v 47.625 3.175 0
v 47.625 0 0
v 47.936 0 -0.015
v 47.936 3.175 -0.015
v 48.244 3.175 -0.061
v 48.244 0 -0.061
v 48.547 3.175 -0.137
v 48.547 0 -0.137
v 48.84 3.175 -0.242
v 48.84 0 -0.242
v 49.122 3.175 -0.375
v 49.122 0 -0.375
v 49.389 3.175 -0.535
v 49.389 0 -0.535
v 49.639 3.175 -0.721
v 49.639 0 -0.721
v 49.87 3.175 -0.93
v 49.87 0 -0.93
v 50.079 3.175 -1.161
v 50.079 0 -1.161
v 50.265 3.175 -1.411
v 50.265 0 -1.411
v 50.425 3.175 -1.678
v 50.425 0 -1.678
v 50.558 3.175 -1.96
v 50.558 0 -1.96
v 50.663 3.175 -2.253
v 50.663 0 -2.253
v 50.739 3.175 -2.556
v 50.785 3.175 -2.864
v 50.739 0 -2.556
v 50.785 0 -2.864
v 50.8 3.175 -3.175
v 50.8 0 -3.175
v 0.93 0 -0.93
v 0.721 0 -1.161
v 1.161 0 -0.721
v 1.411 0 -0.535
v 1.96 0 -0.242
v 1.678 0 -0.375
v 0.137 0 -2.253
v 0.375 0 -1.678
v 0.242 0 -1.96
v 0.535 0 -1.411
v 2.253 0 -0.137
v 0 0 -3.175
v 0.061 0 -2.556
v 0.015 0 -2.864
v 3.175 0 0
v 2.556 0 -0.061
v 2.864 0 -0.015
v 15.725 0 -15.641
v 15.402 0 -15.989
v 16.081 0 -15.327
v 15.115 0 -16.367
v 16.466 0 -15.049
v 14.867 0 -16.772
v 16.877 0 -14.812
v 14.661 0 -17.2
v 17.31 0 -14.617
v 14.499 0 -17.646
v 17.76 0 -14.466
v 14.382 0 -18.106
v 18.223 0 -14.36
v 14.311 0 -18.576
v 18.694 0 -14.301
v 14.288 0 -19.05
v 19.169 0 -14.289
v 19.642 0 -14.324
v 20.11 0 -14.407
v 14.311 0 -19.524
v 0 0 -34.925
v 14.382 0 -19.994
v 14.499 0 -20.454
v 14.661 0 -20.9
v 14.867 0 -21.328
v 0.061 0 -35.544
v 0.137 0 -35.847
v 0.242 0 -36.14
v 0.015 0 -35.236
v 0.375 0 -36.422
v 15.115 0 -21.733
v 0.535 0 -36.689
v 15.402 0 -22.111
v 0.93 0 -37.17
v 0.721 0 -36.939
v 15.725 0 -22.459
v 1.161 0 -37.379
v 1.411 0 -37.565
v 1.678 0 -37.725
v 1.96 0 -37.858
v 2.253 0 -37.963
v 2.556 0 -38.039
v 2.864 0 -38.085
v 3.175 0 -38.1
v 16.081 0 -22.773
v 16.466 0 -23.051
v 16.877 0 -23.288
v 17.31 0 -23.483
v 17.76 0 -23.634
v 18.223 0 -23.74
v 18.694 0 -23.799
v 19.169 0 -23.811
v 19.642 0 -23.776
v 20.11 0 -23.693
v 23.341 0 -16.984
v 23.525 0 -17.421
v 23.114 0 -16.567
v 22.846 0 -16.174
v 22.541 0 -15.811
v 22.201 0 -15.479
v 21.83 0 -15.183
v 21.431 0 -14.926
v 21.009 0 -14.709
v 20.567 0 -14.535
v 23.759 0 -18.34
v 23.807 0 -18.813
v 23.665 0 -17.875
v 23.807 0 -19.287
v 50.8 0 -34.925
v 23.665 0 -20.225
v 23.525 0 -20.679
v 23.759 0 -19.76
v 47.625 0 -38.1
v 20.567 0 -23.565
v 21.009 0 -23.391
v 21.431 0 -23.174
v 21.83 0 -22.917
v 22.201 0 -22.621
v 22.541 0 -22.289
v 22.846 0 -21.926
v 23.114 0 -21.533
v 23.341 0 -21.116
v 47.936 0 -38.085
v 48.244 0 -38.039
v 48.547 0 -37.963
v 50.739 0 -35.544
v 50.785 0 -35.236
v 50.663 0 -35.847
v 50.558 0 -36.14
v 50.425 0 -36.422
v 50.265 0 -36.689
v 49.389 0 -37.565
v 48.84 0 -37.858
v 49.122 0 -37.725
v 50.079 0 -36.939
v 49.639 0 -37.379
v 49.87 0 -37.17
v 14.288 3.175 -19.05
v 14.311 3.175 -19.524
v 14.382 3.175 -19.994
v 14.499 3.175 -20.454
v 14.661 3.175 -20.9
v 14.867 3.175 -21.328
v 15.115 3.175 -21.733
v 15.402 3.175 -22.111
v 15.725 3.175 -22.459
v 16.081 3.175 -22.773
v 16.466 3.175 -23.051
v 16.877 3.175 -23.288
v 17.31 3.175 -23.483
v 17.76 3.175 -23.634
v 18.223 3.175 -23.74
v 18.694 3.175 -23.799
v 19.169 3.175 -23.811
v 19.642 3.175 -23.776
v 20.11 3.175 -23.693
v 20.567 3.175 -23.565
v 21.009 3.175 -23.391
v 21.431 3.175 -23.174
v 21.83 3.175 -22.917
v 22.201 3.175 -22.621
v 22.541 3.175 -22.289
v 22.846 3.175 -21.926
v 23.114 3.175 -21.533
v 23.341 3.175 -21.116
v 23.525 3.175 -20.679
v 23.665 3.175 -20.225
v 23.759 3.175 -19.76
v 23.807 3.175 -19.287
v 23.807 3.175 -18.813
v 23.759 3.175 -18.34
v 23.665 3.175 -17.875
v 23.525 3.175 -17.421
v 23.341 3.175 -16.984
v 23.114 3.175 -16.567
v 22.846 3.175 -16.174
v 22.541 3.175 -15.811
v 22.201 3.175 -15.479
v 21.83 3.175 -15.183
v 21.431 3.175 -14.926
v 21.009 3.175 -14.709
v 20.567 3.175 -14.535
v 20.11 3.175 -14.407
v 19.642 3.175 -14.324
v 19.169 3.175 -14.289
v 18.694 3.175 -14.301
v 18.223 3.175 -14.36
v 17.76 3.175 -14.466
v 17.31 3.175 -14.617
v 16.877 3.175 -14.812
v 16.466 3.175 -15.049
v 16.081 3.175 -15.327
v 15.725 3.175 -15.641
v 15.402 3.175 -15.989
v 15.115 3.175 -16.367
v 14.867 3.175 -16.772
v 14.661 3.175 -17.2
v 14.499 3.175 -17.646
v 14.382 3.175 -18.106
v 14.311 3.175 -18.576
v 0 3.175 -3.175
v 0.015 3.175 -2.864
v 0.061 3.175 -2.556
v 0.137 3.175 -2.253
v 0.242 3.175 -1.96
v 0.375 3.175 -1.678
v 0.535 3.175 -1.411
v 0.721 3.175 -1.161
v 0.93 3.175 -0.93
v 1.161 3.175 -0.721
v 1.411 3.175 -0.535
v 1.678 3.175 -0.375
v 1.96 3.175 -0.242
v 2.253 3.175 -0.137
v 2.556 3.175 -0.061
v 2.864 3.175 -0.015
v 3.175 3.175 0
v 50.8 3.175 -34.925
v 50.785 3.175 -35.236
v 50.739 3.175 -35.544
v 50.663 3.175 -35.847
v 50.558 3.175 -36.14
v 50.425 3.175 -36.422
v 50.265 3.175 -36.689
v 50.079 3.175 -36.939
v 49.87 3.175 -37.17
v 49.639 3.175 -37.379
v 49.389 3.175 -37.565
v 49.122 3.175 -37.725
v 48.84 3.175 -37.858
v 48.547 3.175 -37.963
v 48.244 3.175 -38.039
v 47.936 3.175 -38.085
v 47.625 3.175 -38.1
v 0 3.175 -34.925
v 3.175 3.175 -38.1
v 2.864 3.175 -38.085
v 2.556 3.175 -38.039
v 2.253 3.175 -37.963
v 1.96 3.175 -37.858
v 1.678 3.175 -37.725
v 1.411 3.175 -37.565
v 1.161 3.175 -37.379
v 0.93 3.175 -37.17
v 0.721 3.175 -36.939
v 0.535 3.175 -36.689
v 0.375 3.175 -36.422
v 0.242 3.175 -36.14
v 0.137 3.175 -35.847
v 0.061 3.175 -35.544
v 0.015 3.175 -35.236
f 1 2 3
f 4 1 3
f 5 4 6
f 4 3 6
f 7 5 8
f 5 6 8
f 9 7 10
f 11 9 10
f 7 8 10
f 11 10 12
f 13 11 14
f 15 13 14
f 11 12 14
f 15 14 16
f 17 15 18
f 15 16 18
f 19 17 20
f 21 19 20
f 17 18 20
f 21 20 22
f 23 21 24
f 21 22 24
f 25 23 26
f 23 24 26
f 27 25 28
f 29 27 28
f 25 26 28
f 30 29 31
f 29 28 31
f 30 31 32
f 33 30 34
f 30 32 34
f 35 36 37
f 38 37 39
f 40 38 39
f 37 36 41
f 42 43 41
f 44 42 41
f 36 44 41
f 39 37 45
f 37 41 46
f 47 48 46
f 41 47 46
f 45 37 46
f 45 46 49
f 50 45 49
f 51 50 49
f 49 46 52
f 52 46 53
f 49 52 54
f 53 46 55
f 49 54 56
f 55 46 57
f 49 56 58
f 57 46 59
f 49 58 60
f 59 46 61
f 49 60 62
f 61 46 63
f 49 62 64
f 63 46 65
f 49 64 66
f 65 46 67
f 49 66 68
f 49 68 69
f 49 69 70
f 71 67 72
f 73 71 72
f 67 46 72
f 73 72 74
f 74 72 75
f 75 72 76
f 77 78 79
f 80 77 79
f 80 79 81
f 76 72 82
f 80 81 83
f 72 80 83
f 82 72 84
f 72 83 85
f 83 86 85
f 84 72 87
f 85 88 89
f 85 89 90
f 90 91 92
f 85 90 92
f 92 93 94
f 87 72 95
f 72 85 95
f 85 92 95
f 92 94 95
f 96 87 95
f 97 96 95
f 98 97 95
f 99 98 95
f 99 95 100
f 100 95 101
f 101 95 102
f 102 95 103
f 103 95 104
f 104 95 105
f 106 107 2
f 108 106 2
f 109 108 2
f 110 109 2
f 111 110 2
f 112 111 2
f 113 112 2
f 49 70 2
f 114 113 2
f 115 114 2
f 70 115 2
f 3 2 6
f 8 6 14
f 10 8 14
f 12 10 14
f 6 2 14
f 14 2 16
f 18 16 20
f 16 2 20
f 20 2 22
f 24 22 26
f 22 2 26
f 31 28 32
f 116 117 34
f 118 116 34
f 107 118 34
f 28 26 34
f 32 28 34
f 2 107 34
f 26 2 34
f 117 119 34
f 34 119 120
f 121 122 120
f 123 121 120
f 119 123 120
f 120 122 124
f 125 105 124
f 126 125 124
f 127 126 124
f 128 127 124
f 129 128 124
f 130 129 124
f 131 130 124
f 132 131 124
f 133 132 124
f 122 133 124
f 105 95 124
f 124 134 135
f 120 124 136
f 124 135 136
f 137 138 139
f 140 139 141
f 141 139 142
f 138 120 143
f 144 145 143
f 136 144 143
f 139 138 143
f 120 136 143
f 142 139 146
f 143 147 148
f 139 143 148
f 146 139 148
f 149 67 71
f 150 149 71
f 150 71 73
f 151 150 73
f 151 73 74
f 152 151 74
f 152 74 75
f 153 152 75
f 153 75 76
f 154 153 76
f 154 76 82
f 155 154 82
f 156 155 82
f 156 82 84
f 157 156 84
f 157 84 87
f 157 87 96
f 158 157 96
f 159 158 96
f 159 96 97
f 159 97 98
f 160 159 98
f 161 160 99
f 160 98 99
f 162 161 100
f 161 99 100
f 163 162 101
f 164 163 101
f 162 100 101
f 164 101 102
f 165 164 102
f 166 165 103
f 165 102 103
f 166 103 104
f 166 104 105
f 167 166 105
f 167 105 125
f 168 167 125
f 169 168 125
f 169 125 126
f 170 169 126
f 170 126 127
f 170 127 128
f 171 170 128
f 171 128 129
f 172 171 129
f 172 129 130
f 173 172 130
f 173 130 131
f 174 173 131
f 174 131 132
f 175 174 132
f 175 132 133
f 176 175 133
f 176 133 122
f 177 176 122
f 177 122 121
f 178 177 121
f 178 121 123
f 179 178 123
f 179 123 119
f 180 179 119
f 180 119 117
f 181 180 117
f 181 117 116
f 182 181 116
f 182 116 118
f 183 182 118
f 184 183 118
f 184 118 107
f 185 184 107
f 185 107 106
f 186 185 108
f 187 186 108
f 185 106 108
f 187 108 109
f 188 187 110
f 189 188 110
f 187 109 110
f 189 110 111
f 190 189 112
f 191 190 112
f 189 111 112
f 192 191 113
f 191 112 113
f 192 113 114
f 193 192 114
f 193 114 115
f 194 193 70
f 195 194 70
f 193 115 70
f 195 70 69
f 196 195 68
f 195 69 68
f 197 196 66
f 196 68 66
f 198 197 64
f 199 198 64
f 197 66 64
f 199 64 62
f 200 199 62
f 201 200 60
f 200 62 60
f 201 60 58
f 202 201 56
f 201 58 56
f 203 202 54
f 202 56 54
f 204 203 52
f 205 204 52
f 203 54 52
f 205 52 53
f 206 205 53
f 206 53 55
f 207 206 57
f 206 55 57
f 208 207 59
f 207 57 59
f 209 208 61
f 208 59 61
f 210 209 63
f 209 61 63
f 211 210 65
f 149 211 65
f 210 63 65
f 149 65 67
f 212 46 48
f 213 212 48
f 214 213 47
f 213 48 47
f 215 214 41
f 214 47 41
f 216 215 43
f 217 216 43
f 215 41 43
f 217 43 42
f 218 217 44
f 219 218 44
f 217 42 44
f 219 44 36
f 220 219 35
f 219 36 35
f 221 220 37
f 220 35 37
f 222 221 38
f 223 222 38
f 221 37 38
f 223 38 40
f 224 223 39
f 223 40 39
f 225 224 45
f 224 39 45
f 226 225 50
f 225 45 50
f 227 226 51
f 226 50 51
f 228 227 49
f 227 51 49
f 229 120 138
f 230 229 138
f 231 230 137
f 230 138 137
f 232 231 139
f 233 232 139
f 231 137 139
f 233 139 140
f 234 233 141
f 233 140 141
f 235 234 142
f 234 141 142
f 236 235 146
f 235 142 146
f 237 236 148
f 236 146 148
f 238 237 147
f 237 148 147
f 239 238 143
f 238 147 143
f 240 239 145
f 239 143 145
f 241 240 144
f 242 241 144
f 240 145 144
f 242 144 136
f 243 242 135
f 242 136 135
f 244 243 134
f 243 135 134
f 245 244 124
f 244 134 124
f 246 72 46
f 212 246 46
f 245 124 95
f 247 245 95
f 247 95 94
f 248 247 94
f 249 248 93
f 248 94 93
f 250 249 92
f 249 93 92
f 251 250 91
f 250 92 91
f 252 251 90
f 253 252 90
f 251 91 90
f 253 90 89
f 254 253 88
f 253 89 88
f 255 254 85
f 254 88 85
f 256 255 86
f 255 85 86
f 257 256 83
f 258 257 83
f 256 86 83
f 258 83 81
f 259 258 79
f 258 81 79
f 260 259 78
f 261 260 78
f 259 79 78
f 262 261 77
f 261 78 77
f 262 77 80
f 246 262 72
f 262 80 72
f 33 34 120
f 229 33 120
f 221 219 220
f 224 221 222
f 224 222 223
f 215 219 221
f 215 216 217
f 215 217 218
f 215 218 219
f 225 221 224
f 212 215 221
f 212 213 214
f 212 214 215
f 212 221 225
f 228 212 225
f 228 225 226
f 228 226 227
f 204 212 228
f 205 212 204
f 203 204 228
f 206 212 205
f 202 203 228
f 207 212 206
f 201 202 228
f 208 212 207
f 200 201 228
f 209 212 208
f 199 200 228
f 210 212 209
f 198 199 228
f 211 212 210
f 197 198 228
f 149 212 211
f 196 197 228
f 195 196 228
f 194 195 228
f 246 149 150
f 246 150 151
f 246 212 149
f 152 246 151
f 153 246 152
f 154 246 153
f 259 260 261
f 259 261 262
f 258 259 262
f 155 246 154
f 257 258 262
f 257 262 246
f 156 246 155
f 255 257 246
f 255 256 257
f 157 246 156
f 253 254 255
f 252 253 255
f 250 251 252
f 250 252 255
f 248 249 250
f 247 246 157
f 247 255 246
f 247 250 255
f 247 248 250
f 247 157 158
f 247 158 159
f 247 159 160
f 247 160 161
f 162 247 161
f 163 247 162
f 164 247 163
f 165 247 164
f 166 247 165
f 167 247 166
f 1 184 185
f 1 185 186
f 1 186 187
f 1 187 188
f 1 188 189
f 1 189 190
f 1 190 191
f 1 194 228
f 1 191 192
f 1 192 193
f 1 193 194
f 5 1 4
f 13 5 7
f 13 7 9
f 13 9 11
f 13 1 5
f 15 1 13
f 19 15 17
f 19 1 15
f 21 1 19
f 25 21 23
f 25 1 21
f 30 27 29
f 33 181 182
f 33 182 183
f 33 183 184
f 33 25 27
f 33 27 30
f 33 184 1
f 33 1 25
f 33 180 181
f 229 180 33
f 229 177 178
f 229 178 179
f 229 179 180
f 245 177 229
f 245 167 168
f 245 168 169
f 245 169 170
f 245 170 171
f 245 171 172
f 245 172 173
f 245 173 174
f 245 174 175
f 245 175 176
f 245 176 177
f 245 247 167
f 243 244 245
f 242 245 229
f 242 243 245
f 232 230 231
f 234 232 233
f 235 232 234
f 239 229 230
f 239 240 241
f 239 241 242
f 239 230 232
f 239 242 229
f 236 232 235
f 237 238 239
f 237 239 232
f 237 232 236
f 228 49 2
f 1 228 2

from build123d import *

# Parameters (mm, degrees)
BOSS_EXTRUDE1_DEPTH          = 3.175
F_3_8_0_375_DIAMETER_HOLE1_D = 9.525


with BuildPart() as part:
    # Sketch1 → Boss-Extrude1 (new body)
    with BuildSketch(Plane(origin=(0, 0, 0), x_dir=(1, 0, 0), z_dir=(0, 1, 0))):
        with BuildLine():
            Line((3.175, 0), (47.625, 0))
            ThreePointArc((47.625, 0), (49.87006403, 0.92993597), (50.8, 3.175))
            Line((50.8, 3.175), (50.8, 34.925))
            ThreePointArc((50.8, 34.925), (49.87006403, 37.17006403), (47.625, 38.1))
            Line((47.625, 38.1), (3.175, 38.1))
            ThreePointArc((3.175, 38.1), (0.92993597, 37.17006403), (0, 34.925))
            Line((0, 34.925), (0, 3.175))
            ThreePointArc((0, 3.175), (0.92993597, 0.92993597), (3.175, 0))
        make_face()
    extrude(amount=BOSS_EXTRUDE1_DEPTH)

    # 3/8 (0.375) Diameter Hole1 (through all)
    with Locations(Plane(origin=(0, 3.175, 0), x_dir=(1, 0, 0), z_dir=(0, 1, 0))):
        with Locations((19.05, 19.05)):
            Hole(F_3_8_0_375_DIAMETER_HOLE1_D / 2)


solid = part.part
